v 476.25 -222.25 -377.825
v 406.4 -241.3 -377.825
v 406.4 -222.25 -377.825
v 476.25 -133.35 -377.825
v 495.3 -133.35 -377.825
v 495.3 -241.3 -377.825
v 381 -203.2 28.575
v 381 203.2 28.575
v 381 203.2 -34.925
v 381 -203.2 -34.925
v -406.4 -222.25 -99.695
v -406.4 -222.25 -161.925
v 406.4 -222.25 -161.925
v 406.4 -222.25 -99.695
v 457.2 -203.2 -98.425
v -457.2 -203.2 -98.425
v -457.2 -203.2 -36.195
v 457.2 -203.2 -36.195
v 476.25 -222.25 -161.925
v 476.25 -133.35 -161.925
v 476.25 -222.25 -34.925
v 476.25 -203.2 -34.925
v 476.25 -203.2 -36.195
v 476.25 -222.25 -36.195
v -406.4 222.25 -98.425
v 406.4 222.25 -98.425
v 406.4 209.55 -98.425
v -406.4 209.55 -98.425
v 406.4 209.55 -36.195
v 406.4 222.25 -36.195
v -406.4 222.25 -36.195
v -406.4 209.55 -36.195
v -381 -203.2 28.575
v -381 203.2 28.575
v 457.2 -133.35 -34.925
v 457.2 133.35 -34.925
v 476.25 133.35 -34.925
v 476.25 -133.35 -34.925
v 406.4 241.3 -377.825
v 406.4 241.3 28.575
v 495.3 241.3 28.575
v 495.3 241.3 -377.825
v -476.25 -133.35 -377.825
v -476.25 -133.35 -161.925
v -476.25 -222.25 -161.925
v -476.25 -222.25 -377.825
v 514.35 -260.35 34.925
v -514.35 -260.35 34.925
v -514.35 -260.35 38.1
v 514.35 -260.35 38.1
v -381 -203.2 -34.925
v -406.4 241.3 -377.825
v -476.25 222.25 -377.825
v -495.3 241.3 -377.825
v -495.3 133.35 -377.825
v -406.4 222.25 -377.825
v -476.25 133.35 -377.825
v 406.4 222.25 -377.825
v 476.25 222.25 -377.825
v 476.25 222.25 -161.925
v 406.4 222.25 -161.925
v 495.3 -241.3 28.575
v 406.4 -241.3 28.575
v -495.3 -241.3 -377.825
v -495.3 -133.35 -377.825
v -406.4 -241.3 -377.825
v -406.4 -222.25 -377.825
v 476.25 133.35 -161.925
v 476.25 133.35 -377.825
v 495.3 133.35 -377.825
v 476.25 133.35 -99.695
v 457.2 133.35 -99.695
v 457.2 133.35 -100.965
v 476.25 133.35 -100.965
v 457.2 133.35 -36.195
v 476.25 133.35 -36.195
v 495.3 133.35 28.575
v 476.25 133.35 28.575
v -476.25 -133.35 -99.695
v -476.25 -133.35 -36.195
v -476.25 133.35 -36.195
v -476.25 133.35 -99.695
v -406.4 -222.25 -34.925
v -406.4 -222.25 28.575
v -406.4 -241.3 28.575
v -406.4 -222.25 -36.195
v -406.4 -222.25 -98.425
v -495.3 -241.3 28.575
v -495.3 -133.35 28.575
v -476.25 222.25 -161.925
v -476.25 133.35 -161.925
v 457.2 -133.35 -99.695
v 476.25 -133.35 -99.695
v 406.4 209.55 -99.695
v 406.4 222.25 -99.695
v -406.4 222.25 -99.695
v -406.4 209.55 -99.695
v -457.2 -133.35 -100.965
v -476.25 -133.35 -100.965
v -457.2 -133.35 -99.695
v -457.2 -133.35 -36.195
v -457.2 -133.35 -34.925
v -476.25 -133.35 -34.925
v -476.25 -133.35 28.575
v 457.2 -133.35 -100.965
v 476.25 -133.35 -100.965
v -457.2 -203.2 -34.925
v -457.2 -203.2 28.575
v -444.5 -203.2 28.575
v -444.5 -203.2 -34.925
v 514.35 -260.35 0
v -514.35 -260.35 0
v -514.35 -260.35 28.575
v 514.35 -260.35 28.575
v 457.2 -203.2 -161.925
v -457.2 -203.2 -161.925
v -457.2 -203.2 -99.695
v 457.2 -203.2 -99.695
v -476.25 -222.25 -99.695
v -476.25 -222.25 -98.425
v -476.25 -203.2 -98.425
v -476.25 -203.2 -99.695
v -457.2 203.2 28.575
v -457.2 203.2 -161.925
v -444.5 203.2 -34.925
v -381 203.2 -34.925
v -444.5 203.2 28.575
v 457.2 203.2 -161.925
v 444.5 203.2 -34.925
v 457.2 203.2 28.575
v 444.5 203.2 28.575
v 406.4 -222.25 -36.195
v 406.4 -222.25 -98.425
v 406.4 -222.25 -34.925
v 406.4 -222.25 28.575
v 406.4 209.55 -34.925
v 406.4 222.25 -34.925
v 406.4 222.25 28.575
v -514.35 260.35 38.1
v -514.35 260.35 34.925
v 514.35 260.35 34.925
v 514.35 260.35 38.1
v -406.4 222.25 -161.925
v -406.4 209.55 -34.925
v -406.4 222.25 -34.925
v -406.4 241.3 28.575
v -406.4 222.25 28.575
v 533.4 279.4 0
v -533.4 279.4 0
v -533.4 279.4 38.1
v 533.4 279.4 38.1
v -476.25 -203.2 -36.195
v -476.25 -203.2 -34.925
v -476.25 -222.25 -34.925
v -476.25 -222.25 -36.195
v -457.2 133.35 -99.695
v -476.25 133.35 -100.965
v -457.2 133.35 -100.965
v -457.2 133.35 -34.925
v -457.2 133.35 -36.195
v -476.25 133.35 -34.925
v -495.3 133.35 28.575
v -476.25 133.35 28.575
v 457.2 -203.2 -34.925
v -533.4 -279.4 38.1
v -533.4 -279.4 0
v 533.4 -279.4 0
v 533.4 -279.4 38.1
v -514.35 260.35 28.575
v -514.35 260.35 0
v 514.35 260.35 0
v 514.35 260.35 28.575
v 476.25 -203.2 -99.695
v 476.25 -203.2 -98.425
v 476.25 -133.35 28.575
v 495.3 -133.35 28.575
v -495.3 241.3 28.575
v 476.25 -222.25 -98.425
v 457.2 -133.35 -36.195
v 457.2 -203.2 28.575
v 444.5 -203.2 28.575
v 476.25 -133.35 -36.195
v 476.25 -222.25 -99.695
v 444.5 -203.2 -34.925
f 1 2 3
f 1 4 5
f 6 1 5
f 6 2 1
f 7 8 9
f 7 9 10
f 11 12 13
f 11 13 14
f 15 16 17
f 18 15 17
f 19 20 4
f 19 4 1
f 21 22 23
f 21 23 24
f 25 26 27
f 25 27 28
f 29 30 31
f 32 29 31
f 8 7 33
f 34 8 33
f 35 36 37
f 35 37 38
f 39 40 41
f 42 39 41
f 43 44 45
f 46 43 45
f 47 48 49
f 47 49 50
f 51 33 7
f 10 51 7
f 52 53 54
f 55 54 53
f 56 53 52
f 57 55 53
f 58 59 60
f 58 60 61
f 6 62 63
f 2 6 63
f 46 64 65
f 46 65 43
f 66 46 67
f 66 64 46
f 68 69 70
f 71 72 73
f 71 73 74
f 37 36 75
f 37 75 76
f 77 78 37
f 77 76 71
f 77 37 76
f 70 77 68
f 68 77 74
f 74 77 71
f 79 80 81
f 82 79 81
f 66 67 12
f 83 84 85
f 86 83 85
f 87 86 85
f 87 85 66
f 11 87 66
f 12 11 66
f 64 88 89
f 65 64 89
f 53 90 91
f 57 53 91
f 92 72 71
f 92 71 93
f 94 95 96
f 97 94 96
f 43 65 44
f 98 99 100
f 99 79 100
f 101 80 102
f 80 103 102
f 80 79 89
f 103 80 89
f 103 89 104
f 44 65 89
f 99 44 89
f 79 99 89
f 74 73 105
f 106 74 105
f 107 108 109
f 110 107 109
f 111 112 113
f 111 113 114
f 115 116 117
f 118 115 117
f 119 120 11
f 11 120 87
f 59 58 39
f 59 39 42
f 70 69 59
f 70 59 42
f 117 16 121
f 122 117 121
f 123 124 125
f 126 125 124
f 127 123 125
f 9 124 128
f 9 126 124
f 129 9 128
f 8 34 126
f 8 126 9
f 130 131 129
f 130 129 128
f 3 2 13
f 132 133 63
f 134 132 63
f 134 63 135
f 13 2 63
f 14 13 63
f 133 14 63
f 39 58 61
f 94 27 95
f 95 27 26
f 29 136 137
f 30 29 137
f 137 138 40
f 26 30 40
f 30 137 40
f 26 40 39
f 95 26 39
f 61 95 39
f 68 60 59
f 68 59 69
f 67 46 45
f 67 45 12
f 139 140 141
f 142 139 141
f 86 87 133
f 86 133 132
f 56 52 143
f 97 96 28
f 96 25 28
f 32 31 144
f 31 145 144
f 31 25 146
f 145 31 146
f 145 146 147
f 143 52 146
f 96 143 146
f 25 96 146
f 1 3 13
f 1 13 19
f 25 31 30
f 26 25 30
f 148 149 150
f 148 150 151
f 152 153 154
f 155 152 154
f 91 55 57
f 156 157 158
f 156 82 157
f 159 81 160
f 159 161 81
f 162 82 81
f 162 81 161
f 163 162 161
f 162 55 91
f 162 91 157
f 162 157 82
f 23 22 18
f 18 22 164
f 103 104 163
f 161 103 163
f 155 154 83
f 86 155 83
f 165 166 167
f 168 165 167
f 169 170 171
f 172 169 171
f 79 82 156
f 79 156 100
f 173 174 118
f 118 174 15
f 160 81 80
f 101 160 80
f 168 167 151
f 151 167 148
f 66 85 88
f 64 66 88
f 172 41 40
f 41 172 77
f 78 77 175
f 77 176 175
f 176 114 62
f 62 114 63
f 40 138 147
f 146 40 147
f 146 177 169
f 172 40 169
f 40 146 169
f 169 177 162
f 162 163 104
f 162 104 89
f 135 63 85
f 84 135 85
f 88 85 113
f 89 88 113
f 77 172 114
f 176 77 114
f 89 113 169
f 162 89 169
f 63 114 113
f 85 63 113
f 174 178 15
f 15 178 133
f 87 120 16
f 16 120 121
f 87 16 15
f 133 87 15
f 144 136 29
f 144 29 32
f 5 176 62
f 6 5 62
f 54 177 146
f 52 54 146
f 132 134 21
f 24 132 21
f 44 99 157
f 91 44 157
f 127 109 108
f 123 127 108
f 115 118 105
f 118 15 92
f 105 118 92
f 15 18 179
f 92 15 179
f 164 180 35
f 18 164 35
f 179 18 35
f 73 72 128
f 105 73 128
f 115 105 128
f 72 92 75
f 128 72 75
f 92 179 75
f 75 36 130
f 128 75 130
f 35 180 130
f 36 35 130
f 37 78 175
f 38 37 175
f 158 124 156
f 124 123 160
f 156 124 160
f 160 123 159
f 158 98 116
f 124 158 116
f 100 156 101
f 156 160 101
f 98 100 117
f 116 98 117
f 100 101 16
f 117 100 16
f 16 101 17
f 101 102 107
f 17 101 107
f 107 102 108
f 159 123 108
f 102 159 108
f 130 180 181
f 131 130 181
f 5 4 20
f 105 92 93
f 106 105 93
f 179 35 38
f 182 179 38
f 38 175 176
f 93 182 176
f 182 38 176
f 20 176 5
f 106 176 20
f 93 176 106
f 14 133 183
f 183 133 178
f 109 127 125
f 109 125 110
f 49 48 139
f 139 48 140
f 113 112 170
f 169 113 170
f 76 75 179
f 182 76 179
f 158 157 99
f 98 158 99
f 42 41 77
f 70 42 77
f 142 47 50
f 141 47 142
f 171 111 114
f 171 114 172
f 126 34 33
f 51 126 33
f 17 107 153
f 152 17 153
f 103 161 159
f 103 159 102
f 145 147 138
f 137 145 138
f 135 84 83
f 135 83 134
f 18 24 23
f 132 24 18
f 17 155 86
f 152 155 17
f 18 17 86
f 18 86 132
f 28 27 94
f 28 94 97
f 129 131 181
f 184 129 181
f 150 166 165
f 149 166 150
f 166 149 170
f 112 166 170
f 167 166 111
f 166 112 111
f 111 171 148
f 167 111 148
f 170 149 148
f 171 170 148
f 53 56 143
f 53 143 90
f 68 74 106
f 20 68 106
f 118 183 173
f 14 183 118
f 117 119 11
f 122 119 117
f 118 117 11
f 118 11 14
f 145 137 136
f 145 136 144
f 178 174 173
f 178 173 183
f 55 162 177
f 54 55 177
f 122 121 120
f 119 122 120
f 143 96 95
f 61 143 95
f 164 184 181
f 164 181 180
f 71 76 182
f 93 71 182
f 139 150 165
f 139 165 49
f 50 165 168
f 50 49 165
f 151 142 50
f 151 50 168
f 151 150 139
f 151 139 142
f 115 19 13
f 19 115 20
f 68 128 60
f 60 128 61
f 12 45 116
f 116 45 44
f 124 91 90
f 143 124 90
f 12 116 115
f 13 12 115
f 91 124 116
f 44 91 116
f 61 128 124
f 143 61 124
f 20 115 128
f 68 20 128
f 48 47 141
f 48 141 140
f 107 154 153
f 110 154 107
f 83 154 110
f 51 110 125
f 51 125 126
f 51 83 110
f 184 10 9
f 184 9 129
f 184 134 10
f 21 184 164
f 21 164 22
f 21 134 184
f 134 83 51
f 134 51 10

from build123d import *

# Parameters (mm, degrees)
F0_W      = 1066.8
F0_H      = 558.8
F0_W_2    = 1028.7
F0_H_2    = 520.7
F1_DEPTH  = 38.1
F2_W      = 1028.7
F2_H      = 6.35
F3_DEPTH  = 520.7
F4_W      = 952.5
F4_H      = 19.05
F5_DEPTH  = 63.5
F6_W      = 63.5
F6_H      = 406.4
F7_DEPTH  = 63.5
F8_W      = 19.05
F8_H      = 88.9
F9_DEPTH  = 406.4
F10_W     = 914.4
F10_H     = 19.05
F11_DEPTH = 190.5
F12_W     = 812.8
F12_H     = 1.27
F13_DEPTH = 12.7
F14_W     = 266.7
F14_H     = 1.27
F15_DEPTH = 952.5
F16_W     = 19.05
F16_H     = 62.23
F17_DEPTH = 952.5


with BuildPart() as f1:
    # F0 (on Top) → F1 (new body)
    with BuildSketch(Plane.XY):
        Rectangle(F0_W, F0_H)
        Rectangle(F0_W_2, F0_H_2, mode=Mode.SUBTRACT)
    extrude(amount=F1_DEPTH)

    # F2 (on face) → F3 (join)
    with BuildSketch(Plane(origin=(0, -260.35, 0), x_dir=(-1, 0, 0), z_dir=(0, 1, 0))):
        with Locations((0, 31.75)):
            Rectangle(F2_W, F2_H)
    extrude(amount=F3_DEPTH)

    # F4 (on face) → F5 (join)
    with BuildSketch(Plane(origin=(0, 0, 28.575), x_dir=(1, 0, 0), z_dir=(0, 0, -1))):
        with Locations((0, 212.725)):
            Rectangle(F4_W, F4_H)
    extrude(amount=F5_DEPTH)

    # F6 (on face) → F7 (join)
    with BuildSketch(Plane(origin=(0, 0, 28.575), x_dir=(1, 0, 0), z_dir=(0, 0, -1))):
        with Locations((-412.75, 0)):
            Rectangle(F6_W, F6_H)
        with Locations((412.75, 0)):
            Rectangle(F6_W, F6_H)
    extrude(amount=F7_DEPTH)

    # F8 (on face) → F9 (join)
    with BuildSketch(Plane(origin=(0, 0, 28.575), x_dir=(1, 0, 0), z_dir=(0, 0, -1))):
        Polygon((-406.4, 241.3), (-495.3, 241.3), (-495.3, 222.25), (-476.25, 222.25), (-406.4, 222.25), align=None)
        with Locations((-485.775, 177.8)):
            Rectangle(F8_W, F8_H)
        with Locations((-485.775, -177.8)):
            Rectangle(F8_W, F8_H)
        Polygon((-476.25, -222.25), (-495.3, -222.25), (-495.3, -241.3), (-406.4, -241.3), (-406.4, -222.25), align=None)
        Polygon((476.25, -222.25), (406.4, -222.25), (406.4, -241.3), (495.3, -241.3), (495.3, -222.25), align=None)
        with Locations((485.775, -177.8)):
            Rectangle(F8_W, F8_H)
        Polygon((495.3, 241.3), (406.4, 241.3), (406.4, 222.25), (476.25, 222.25), (495.3, 222.25), align=None)
        with Locations((485.775, 177.8)):
            Rectangle(F8_W, F8_H)
    extrude(amount=F9_DEPTH)

    # F10 (on face) → F11 (join)
    with BuildSketch(Plane(origin=(0, 0, 28.575), x_dir=(1, 0, 0), z_dir=(0, 0, -1))):
        Polygon((476.25, -222.25), (476.25, 203.2), (457.2, 203.2), (457.2, -203.2), (457.2, -222.25), align=None)
        with Locations((0, -212.725)):
            Rectangle(F10_W, F10_H)
        Polygon((-457.2, -222.25), (-457.2, -203.2), (-457.2, 203.2), (-476.25, 203.2), (-476.25, -222.25), align=None)
    extrude(amount=F11_DEPTH)

    # F12 (on face) → F13 (cut)
    with BuildSketch(Plane(origin=(0, 222.25, 0), x_dir=(-1, 0, 0), z_dir=(0, 1, 0))):
        with Locations((0, -35.56)):
            Rectangle(F12_W, F12_H)
        with Locations((0, -99.06)):
            Rectangle(F12_W, F12_H)
    extrude(amount=-F13_DEPTH, mode=Mode.SUBTRACT)

    # F14 (on face) → F15 (cut)
    with BuildSketch(Plane(origin=(-476.25, 0, 0), x_dir=(0, -1, 0), z_dir=(-1, 0, 0))):
        with Locations((0, -35.56)):
            Rectangle(F14_W, F14_H)
        with Locations((0, -100.33)):
            Rectangle(F14_W, F14_H)
    extrude(amount=-F15_DEPTH, mode=Mode.SUBTRACT)

    # F16 (on face) → F17 (join)
    with BuildSketch(Plane.YZ.offset(-476.25)):
        with Locations((-212.725, -130.81)):
            Rectangle(F16_W, F16_H)
        with Locations((-212.725, -67.31)):
            Rectangle(F16_W, F16_H)
    extrude(amount=F17_DEPTH)


solid = f1.part
